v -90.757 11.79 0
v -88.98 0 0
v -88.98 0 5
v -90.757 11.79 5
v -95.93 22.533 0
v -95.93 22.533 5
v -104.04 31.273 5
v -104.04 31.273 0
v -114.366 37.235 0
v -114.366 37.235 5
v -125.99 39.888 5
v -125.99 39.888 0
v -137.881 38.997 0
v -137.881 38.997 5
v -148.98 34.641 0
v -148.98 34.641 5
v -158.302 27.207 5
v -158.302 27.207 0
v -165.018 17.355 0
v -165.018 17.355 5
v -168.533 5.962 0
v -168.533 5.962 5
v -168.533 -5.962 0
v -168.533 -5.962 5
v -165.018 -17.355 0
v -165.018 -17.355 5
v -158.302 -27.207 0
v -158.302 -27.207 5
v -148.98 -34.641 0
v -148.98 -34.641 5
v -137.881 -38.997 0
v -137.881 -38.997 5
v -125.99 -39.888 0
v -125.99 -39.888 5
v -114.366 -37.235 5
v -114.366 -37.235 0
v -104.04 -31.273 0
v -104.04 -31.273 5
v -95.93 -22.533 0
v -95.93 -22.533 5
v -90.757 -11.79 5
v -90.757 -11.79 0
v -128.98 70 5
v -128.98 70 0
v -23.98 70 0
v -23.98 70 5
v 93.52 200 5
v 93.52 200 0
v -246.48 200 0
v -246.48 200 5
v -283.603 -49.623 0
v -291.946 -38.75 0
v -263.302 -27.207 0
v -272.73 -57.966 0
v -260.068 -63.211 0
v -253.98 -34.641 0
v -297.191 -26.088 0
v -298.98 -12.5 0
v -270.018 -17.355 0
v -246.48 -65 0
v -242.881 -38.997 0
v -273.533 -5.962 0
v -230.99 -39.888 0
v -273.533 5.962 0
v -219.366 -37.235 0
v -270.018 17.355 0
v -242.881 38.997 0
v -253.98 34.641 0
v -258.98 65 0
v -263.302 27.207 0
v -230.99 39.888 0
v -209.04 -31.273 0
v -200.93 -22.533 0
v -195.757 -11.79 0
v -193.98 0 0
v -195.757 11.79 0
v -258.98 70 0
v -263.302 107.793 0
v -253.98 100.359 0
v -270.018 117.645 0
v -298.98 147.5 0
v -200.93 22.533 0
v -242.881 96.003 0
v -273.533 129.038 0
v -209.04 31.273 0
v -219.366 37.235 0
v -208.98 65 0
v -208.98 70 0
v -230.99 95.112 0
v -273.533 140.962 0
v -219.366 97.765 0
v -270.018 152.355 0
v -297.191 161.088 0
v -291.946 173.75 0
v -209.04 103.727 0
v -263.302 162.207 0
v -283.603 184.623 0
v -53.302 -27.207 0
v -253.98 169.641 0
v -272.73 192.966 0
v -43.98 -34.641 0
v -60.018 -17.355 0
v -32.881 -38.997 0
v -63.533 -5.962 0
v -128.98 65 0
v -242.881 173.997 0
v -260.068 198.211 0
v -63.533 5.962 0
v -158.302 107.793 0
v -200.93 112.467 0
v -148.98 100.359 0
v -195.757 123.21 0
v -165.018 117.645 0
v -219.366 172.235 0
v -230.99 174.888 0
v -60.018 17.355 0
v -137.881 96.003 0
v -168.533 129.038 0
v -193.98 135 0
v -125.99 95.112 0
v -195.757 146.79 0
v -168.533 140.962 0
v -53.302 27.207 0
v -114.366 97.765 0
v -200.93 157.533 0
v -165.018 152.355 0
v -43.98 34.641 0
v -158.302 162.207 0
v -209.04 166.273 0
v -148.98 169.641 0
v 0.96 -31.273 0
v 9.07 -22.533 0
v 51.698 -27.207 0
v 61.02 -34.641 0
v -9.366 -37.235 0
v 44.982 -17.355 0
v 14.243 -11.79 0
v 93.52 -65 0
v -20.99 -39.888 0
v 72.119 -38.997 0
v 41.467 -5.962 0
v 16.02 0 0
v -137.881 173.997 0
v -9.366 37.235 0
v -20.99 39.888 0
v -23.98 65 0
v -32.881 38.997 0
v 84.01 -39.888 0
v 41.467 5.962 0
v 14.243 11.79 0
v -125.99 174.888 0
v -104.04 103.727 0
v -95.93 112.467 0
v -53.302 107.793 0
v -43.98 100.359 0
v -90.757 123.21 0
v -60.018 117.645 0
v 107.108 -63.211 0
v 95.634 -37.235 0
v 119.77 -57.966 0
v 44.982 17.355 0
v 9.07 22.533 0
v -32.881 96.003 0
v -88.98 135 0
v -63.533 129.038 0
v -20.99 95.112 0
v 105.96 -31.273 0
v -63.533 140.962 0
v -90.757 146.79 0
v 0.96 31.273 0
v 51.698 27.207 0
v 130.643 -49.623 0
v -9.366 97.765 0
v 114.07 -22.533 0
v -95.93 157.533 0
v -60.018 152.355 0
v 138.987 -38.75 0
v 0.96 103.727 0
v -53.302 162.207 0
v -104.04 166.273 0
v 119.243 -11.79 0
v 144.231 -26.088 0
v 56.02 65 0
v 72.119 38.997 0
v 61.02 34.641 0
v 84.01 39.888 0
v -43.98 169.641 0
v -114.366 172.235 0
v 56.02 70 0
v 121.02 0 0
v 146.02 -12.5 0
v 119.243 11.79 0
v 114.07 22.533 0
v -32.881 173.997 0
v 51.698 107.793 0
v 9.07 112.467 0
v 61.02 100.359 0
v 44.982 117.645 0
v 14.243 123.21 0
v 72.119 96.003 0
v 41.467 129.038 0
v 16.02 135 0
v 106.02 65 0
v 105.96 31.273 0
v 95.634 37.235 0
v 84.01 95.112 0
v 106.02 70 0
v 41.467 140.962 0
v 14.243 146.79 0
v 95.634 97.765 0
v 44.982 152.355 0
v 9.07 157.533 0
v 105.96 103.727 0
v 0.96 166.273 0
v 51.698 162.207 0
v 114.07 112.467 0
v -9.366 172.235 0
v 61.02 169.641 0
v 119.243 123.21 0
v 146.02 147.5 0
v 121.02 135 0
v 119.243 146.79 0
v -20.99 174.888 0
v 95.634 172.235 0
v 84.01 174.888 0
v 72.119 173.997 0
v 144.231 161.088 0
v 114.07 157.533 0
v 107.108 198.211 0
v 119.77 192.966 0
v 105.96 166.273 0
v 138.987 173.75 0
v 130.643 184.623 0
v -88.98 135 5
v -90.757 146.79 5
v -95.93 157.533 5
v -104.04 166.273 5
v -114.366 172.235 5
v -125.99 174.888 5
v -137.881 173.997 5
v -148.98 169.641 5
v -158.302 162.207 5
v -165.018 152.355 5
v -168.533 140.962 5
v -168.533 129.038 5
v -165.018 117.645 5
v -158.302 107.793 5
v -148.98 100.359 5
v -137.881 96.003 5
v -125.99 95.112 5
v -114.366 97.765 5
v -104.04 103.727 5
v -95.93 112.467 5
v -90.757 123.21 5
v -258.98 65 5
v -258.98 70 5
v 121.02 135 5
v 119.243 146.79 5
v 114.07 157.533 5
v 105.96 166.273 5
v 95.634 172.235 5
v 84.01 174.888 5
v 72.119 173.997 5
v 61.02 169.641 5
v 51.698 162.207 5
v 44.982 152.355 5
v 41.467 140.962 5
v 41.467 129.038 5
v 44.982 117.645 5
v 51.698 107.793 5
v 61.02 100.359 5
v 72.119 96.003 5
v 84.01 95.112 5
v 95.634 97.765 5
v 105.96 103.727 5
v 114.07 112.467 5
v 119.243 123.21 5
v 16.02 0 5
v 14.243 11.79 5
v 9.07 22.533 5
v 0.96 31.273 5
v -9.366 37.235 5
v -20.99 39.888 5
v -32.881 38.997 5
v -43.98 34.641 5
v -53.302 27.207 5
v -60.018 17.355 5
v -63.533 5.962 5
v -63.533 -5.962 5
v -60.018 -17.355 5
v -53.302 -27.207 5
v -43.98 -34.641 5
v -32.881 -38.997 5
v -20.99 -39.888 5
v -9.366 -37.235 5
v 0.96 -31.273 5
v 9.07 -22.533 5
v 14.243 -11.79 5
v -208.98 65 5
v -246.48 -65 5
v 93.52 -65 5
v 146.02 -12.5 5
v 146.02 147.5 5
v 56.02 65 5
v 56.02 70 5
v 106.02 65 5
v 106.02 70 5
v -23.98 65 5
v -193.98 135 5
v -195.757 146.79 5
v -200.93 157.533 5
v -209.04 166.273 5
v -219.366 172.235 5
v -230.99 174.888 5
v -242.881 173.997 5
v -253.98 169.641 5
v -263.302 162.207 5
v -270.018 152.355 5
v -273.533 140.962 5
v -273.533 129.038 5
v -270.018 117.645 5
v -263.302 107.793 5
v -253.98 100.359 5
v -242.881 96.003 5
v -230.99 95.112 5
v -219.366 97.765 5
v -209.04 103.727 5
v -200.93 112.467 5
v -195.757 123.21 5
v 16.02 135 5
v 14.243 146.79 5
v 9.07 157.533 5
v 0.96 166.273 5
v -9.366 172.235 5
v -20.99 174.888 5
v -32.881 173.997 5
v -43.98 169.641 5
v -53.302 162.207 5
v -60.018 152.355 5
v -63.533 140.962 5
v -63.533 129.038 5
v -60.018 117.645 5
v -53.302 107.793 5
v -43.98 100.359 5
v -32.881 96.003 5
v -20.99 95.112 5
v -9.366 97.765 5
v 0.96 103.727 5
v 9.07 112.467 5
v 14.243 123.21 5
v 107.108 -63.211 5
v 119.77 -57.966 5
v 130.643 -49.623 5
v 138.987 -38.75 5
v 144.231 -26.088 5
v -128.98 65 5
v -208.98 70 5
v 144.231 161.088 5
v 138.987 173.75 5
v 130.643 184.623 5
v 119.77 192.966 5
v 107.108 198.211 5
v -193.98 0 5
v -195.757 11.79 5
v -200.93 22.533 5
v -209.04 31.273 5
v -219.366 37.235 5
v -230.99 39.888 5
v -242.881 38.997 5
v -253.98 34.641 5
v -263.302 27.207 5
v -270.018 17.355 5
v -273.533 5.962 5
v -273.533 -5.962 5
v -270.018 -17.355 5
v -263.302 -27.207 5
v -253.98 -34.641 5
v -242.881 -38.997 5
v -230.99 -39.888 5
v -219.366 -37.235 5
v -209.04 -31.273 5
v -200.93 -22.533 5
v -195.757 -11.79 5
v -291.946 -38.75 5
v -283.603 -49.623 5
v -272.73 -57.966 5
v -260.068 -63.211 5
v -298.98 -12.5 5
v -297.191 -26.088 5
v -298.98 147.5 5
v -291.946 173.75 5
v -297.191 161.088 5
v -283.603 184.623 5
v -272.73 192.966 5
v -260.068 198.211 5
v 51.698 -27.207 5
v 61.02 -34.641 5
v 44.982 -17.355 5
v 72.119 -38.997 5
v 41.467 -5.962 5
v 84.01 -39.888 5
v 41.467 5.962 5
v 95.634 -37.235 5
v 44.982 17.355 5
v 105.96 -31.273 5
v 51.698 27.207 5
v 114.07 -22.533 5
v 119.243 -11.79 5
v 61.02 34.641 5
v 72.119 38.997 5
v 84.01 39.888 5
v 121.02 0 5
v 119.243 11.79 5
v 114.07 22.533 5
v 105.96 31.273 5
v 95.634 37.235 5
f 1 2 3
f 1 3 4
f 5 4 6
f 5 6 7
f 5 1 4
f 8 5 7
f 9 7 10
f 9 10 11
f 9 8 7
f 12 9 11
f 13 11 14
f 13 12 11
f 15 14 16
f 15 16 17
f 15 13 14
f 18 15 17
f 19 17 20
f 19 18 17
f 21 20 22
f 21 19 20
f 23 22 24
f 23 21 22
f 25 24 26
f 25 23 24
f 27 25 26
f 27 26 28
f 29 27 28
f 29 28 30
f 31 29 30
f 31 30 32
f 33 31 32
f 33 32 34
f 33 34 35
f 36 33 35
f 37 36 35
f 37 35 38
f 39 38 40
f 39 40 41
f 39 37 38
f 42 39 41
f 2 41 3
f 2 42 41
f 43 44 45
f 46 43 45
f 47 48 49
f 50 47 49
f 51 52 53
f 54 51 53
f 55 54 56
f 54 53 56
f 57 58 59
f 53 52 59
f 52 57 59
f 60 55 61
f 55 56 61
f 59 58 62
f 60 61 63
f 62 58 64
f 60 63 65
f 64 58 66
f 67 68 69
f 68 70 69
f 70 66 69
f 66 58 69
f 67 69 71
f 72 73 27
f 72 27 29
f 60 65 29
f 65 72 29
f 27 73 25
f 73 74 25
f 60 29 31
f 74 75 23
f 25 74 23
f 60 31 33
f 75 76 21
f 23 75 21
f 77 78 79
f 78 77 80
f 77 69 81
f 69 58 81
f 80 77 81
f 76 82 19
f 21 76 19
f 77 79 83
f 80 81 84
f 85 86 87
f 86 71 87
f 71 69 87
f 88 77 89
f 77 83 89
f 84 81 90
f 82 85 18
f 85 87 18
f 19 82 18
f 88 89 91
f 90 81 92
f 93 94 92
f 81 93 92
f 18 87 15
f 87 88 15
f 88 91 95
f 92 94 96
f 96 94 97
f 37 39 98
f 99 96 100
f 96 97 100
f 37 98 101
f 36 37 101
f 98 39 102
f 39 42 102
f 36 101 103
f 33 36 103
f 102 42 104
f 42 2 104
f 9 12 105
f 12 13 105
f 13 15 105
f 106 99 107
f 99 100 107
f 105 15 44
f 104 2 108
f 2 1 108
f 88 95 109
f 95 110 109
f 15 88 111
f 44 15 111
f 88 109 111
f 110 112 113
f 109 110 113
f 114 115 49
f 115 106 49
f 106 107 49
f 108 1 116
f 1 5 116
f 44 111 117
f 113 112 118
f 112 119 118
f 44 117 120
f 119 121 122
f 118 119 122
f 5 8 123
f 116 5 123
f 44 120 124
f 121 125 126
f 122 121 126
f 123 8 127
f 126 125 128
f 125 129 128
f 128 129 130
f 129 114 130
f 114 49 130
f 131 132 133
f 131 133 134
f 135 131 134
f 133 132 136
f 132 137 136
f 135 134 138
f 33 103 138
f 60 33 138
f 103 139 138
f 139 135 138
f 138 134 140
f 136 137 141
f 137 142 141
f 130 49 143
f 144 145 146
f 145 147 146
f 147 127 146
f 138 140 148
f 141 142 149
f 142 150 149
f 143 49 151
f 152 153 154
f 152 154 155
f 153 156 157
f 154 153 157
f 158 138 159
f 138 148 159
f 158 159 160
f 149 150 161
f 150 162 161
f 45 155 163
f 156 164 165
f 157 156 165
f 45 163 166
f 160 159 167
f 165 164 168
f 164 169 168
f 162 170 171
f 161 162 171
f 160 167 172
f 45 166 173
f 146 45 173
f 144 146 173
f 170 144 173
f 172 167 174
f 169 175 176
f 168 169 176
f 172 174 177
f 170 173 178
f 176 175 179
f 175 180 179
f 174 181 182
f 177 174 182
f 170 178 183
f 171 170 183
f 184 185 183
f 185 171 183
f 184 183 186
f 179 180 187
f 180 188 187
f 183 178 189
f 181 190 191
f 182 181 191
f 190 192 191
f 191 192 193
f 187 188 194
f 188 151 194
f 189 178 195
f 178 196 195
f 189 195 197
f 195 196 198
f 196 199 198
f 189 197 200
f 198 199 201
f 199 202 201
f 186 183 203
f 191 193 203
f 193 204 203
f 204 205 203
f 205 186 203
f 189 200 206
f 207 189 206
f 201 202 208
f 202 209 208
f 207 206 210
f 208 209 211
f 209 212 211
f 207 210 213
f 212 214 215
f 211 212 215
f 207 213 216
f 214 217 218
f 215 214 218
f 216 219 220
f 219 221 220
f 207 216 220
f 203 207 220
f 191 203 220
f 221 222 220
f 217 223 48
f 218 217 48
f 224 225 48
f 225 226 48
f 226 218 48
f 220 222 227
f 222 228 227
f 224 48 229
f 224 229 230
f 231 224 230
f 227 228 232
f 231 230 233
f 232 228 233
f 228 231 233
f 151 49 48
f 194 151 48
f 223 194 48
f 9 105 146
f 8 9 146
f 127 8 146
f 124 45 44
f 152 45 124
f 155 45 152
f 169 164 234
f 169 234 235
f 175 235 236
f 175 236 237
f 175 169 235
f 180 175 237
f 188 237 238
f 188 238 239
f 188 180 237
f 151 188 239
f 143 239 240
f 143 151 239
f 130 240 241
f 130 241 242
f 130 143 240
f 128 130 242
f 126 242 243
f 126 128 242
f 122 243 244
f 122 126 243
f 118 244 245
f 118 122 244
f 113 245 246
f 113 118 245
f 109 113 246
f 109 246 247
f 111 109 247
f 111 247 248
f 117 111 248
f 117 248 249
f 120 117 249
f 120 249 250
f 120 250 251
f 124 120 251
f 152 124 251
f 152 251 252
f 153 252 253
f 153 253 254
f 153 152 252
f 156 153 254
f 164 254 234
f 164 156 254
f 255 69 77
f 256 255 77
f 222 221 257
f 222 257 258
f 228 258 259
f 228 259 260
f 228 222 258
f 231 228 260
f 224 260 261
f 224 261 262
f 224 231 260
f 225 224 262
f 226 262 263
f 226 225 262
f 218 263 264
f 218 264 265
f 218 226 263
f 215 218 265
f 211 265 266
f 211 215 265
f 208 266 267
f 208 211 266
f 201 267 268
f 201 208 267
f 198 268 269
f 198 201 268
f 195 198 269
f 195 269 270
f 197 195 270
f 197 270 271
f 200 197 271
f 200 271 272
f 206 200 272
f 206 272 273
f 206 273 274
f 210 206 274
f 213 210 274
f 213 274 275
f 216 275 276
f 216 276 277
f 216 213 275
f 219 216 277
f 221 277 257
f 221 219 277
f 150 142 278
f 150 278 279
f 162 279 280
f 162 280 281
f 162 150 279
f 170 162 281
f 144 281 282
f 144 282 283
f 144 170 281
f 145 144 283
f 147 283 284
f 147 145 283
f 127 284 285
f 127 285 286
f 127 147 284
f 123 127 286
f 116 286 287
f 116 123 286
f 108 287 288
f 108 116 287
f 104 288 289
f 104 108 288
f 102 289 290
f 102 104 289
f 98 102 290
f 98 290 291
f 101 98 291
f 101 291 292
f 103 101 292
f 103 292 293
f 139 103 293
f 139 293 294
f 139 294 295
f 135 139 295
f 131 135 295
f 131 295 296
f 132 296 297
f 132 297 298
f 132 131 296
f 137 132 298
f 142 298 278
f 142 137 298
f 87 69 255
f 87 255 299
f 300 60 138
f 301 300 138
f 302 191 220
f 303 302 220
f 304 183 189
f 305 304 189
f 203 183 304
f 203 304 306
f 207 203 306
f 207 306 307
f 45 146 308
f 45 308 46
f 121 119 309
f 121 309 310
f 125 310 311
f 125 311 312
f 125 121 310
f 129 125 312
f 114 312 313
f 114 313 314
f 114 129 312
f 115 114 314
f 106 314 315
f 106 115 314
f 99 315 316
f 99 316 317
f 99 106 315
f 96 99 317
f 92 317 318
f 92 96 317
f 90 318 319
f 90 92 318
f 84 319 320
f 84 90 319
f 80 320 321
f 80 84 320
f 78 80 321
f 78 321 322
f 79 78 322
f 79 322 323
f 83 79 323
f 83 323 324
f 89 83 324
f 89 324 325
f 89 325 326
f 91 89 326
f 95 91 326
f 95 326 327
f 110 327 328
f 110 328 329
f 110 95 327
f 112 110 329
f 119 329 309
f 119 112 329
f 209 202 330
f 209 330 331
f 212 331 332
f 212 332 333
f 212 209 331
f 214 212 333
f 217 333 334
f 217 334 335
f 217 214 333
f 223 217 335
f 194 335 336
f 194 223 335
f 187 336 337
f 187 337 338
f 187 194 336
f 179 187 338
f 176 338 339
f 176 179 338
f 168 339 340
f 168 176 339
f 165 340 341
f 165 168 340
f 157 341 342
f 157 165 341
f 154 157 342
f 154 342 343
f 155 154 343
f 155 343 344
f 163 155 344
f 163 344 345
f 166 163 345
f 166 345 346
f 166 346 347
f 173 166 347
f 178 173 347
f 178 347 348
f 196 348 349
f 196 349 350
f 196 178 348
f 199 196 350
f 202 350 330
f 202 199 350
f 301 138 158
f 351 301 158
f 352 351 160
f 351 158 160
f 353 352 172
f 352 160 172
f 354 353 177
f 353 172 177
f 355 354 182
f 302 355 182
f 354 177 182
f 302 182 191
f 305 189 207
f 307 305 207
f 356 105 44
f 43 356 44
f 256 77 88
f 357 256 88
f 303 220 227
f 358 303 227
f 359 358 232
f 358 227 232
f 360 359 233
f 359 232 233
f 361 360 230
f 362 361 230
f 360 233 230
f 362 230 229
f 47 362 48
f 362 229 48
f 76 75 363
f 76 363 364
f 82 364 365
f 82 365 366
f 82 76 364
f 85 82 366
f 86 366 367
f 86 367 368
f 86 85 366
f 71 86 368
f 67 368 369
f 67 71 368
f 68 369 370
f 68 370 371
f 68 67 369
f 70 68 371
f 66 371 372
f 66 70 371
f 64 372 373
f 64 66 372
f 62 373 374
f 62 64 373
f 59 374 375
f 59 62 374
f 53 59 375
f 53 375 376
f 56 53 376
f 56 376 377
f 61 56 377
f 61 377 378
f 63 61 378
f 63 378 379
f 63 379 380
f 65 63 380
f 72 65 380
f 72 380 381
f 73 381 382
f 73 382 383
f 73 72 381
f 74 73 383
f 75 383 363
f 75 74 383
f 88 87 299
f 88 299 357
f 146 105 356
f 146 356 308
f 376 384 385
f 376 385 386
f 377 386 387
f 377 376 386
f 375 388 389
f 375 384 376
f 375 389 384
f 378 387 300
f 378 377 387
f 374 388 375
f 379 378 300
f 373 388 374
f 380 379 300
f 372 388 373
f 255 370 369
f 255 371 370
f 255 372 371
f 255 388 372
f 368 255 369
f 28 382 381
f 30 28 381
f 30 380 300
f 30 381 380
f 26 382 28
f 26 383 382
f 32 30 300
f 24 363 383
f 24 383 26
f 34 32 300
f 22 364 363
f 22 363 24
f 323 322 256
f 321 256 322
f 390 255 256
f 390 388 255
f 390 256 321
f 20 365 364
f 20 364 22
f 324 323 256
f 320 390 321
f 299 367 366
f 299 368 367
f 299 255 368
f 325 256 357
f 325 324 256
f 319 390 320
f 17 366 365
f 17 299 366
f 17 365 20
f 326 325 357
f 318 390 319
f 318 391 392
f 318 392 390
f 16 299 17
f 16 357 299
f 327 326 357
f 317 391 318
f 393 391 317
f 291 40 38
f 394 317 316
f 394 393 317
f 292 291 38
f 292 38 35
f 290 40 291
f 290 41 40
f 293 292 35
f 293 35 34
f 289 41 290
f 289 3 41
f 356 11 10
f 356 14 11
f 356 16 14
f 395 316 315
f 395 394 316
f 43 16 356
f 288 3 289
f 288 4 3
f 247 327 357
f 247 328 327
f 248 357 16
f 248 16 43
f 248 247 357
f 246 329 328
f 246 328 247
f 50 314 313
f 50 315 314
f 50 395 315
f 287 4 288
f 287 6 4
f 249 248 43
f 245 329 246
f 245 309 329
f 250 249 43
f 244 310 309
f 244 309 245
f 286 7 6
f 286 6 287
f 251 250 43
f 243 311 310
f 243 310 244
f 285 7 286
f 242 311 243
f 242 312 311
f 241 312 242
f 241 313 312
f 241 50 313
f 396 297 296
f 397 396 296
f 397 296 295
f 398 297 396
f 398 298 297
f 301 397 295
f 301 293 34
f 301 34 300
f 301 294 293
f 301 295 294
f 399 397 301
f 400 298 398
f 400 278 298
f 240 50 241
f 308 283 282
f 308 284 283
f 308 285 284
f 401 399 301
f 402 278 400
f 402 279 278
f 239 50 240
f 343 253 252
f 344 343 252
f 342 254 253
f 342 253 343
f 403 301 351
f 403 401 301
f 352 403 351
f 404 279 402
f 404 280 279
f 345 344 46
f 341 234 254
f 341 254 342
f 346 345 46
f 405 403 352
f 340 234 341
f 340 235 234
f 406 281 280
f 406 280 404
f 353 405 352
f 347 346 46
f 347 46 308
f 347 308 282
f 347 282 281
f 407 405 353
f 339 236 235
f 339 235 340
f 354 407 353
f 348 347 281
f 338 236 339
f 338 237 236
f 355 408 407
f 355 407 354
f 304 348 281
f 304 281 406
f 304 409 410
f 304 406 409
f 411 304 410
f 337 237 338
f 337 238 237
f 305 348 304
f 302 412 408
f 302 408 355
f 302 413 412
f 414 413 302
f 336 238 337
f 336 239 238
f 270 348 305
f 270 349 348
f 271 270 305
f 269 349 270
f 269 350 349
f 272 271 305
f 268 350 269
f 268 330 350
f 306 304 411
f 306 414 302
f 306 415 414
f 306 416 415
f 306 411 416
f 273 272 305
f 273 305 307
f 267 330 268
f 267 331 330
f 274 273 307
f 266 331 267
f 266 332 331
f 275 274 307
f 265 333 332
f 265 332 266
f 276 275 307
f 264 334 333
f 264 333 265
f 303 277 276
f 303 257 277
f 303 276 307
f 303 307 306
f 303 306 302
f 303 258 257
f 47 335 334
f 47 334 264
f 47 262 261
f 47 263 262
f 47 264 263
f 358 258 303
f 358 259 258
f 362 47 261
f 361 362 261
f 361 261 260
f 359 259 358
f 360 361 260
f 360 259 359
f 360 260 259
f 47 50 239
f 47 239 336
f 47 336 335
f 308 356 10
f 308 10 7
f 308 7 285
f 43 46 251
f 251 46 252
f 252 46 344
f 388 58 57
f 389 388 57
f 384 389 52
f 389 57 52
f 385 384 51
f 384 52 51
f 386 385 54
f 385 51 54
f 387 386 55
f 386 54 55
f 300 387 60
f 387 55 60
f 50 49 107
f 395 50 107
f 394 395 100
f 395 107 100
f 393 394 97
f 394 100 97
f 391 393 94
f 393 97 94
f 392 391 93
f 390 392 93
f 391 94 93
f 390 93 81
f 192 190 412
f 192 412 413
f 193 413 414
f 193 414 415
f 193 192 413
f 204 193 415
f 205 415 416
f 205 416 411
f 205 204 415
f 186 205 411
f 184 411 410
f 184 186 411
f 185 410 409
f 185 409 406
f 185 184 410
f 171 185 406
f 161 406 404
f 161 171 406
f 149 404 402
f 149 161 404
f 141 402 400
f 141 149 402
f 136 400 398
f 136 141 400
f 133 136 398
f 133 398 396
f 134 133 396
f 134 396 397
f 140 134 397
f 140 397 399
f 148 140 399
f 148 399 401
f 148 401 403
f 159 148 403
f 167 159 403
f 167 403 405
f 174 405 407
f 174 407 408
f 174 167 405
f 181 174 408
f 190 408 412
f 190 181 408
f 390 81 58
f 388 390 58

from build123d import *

# Parameters (mm, degrees)
F0_R     = 40
F0_W     = 50
F0_H     = 5
F0_W_2   = 105
F1_DEPTH = 5


with BuildPart() as f1:
    # F0 (on Top) → F1 (new body)
    with BuildSketch(Plane.XY):
        with BuildLine():
            ThreePointArc((146.020335, 147.5), (130.643441, 184.623106), (93.520335, 200))
            Line((93.520335, 200), (-246.479665, 200))
            ThreePointArc((-246.479665, 200), (-283.602771, 184.623106), (-298.979665, 147.5))
            Line((-298.979665, 147.5), (-298.979665, -12.5))
            ThreePointArc((-298.979665, -12.5), (-283.602771, -49.623106), (-246.479665, -65))
            Line((-246.479665, -65), (93.520335, -65))
            ThreePointArc((93.520335, -65), (130.643441, -49.623106), (146.020335, -12.5))
            Line((146.020335, -12.5), (146.020335, 65))
            Line((146.020335, 65), (146.020335, 70))
            Line((146.020335, 70), (146.020335, 147.5))
        make_face()
        with Locations((-233.979665, 0)):
            Circle(F0_R, mode=Mode.SUBTRACT)
        with Locations((-128.979665, 0)):
            Circle(F0_R, mode=Mode.SUBTRACT)
        with Locations((-23.979665, 0)):
            Circle(F0_R, mode=Mode.SUBTRACT)
        with Locations((81.020335, 0)):
            Circle(F0_R, mode=Mode.SUBTRACT)
        with Locations((-233.979665, 67.5)):
            Rectangle(F0_W, F0_H, mode=Mode.SUBTRACT)
        with Locations((-233.979665, 135)):
            Circle(F0_R, mode=Mode.SUBTRACT)
        with Locations((-128.979665, 135)):
            Circle(F0_R, mode=Mode.SUBTRACT)
        with Locations((-76.479665, 67.5)):
            Rectangle(F0_W_2, F0_H, mode=Mode.SUBTRACT)
        with Locations((81.020335, 67.5)):
            Rectangle(F0_W, F0_H, mode=Mode.SUBTRACT)
        with Locations((-23.979665, 135)):
            Circle(F0_R, mode=Mode.SUBTRACT)
        with Locations((81.020335, 135)):
            Circle(F0_R, mode=Mode.SUBTRACT)
    extrude(amount=F1_DEPTH)


solid = f1.part
